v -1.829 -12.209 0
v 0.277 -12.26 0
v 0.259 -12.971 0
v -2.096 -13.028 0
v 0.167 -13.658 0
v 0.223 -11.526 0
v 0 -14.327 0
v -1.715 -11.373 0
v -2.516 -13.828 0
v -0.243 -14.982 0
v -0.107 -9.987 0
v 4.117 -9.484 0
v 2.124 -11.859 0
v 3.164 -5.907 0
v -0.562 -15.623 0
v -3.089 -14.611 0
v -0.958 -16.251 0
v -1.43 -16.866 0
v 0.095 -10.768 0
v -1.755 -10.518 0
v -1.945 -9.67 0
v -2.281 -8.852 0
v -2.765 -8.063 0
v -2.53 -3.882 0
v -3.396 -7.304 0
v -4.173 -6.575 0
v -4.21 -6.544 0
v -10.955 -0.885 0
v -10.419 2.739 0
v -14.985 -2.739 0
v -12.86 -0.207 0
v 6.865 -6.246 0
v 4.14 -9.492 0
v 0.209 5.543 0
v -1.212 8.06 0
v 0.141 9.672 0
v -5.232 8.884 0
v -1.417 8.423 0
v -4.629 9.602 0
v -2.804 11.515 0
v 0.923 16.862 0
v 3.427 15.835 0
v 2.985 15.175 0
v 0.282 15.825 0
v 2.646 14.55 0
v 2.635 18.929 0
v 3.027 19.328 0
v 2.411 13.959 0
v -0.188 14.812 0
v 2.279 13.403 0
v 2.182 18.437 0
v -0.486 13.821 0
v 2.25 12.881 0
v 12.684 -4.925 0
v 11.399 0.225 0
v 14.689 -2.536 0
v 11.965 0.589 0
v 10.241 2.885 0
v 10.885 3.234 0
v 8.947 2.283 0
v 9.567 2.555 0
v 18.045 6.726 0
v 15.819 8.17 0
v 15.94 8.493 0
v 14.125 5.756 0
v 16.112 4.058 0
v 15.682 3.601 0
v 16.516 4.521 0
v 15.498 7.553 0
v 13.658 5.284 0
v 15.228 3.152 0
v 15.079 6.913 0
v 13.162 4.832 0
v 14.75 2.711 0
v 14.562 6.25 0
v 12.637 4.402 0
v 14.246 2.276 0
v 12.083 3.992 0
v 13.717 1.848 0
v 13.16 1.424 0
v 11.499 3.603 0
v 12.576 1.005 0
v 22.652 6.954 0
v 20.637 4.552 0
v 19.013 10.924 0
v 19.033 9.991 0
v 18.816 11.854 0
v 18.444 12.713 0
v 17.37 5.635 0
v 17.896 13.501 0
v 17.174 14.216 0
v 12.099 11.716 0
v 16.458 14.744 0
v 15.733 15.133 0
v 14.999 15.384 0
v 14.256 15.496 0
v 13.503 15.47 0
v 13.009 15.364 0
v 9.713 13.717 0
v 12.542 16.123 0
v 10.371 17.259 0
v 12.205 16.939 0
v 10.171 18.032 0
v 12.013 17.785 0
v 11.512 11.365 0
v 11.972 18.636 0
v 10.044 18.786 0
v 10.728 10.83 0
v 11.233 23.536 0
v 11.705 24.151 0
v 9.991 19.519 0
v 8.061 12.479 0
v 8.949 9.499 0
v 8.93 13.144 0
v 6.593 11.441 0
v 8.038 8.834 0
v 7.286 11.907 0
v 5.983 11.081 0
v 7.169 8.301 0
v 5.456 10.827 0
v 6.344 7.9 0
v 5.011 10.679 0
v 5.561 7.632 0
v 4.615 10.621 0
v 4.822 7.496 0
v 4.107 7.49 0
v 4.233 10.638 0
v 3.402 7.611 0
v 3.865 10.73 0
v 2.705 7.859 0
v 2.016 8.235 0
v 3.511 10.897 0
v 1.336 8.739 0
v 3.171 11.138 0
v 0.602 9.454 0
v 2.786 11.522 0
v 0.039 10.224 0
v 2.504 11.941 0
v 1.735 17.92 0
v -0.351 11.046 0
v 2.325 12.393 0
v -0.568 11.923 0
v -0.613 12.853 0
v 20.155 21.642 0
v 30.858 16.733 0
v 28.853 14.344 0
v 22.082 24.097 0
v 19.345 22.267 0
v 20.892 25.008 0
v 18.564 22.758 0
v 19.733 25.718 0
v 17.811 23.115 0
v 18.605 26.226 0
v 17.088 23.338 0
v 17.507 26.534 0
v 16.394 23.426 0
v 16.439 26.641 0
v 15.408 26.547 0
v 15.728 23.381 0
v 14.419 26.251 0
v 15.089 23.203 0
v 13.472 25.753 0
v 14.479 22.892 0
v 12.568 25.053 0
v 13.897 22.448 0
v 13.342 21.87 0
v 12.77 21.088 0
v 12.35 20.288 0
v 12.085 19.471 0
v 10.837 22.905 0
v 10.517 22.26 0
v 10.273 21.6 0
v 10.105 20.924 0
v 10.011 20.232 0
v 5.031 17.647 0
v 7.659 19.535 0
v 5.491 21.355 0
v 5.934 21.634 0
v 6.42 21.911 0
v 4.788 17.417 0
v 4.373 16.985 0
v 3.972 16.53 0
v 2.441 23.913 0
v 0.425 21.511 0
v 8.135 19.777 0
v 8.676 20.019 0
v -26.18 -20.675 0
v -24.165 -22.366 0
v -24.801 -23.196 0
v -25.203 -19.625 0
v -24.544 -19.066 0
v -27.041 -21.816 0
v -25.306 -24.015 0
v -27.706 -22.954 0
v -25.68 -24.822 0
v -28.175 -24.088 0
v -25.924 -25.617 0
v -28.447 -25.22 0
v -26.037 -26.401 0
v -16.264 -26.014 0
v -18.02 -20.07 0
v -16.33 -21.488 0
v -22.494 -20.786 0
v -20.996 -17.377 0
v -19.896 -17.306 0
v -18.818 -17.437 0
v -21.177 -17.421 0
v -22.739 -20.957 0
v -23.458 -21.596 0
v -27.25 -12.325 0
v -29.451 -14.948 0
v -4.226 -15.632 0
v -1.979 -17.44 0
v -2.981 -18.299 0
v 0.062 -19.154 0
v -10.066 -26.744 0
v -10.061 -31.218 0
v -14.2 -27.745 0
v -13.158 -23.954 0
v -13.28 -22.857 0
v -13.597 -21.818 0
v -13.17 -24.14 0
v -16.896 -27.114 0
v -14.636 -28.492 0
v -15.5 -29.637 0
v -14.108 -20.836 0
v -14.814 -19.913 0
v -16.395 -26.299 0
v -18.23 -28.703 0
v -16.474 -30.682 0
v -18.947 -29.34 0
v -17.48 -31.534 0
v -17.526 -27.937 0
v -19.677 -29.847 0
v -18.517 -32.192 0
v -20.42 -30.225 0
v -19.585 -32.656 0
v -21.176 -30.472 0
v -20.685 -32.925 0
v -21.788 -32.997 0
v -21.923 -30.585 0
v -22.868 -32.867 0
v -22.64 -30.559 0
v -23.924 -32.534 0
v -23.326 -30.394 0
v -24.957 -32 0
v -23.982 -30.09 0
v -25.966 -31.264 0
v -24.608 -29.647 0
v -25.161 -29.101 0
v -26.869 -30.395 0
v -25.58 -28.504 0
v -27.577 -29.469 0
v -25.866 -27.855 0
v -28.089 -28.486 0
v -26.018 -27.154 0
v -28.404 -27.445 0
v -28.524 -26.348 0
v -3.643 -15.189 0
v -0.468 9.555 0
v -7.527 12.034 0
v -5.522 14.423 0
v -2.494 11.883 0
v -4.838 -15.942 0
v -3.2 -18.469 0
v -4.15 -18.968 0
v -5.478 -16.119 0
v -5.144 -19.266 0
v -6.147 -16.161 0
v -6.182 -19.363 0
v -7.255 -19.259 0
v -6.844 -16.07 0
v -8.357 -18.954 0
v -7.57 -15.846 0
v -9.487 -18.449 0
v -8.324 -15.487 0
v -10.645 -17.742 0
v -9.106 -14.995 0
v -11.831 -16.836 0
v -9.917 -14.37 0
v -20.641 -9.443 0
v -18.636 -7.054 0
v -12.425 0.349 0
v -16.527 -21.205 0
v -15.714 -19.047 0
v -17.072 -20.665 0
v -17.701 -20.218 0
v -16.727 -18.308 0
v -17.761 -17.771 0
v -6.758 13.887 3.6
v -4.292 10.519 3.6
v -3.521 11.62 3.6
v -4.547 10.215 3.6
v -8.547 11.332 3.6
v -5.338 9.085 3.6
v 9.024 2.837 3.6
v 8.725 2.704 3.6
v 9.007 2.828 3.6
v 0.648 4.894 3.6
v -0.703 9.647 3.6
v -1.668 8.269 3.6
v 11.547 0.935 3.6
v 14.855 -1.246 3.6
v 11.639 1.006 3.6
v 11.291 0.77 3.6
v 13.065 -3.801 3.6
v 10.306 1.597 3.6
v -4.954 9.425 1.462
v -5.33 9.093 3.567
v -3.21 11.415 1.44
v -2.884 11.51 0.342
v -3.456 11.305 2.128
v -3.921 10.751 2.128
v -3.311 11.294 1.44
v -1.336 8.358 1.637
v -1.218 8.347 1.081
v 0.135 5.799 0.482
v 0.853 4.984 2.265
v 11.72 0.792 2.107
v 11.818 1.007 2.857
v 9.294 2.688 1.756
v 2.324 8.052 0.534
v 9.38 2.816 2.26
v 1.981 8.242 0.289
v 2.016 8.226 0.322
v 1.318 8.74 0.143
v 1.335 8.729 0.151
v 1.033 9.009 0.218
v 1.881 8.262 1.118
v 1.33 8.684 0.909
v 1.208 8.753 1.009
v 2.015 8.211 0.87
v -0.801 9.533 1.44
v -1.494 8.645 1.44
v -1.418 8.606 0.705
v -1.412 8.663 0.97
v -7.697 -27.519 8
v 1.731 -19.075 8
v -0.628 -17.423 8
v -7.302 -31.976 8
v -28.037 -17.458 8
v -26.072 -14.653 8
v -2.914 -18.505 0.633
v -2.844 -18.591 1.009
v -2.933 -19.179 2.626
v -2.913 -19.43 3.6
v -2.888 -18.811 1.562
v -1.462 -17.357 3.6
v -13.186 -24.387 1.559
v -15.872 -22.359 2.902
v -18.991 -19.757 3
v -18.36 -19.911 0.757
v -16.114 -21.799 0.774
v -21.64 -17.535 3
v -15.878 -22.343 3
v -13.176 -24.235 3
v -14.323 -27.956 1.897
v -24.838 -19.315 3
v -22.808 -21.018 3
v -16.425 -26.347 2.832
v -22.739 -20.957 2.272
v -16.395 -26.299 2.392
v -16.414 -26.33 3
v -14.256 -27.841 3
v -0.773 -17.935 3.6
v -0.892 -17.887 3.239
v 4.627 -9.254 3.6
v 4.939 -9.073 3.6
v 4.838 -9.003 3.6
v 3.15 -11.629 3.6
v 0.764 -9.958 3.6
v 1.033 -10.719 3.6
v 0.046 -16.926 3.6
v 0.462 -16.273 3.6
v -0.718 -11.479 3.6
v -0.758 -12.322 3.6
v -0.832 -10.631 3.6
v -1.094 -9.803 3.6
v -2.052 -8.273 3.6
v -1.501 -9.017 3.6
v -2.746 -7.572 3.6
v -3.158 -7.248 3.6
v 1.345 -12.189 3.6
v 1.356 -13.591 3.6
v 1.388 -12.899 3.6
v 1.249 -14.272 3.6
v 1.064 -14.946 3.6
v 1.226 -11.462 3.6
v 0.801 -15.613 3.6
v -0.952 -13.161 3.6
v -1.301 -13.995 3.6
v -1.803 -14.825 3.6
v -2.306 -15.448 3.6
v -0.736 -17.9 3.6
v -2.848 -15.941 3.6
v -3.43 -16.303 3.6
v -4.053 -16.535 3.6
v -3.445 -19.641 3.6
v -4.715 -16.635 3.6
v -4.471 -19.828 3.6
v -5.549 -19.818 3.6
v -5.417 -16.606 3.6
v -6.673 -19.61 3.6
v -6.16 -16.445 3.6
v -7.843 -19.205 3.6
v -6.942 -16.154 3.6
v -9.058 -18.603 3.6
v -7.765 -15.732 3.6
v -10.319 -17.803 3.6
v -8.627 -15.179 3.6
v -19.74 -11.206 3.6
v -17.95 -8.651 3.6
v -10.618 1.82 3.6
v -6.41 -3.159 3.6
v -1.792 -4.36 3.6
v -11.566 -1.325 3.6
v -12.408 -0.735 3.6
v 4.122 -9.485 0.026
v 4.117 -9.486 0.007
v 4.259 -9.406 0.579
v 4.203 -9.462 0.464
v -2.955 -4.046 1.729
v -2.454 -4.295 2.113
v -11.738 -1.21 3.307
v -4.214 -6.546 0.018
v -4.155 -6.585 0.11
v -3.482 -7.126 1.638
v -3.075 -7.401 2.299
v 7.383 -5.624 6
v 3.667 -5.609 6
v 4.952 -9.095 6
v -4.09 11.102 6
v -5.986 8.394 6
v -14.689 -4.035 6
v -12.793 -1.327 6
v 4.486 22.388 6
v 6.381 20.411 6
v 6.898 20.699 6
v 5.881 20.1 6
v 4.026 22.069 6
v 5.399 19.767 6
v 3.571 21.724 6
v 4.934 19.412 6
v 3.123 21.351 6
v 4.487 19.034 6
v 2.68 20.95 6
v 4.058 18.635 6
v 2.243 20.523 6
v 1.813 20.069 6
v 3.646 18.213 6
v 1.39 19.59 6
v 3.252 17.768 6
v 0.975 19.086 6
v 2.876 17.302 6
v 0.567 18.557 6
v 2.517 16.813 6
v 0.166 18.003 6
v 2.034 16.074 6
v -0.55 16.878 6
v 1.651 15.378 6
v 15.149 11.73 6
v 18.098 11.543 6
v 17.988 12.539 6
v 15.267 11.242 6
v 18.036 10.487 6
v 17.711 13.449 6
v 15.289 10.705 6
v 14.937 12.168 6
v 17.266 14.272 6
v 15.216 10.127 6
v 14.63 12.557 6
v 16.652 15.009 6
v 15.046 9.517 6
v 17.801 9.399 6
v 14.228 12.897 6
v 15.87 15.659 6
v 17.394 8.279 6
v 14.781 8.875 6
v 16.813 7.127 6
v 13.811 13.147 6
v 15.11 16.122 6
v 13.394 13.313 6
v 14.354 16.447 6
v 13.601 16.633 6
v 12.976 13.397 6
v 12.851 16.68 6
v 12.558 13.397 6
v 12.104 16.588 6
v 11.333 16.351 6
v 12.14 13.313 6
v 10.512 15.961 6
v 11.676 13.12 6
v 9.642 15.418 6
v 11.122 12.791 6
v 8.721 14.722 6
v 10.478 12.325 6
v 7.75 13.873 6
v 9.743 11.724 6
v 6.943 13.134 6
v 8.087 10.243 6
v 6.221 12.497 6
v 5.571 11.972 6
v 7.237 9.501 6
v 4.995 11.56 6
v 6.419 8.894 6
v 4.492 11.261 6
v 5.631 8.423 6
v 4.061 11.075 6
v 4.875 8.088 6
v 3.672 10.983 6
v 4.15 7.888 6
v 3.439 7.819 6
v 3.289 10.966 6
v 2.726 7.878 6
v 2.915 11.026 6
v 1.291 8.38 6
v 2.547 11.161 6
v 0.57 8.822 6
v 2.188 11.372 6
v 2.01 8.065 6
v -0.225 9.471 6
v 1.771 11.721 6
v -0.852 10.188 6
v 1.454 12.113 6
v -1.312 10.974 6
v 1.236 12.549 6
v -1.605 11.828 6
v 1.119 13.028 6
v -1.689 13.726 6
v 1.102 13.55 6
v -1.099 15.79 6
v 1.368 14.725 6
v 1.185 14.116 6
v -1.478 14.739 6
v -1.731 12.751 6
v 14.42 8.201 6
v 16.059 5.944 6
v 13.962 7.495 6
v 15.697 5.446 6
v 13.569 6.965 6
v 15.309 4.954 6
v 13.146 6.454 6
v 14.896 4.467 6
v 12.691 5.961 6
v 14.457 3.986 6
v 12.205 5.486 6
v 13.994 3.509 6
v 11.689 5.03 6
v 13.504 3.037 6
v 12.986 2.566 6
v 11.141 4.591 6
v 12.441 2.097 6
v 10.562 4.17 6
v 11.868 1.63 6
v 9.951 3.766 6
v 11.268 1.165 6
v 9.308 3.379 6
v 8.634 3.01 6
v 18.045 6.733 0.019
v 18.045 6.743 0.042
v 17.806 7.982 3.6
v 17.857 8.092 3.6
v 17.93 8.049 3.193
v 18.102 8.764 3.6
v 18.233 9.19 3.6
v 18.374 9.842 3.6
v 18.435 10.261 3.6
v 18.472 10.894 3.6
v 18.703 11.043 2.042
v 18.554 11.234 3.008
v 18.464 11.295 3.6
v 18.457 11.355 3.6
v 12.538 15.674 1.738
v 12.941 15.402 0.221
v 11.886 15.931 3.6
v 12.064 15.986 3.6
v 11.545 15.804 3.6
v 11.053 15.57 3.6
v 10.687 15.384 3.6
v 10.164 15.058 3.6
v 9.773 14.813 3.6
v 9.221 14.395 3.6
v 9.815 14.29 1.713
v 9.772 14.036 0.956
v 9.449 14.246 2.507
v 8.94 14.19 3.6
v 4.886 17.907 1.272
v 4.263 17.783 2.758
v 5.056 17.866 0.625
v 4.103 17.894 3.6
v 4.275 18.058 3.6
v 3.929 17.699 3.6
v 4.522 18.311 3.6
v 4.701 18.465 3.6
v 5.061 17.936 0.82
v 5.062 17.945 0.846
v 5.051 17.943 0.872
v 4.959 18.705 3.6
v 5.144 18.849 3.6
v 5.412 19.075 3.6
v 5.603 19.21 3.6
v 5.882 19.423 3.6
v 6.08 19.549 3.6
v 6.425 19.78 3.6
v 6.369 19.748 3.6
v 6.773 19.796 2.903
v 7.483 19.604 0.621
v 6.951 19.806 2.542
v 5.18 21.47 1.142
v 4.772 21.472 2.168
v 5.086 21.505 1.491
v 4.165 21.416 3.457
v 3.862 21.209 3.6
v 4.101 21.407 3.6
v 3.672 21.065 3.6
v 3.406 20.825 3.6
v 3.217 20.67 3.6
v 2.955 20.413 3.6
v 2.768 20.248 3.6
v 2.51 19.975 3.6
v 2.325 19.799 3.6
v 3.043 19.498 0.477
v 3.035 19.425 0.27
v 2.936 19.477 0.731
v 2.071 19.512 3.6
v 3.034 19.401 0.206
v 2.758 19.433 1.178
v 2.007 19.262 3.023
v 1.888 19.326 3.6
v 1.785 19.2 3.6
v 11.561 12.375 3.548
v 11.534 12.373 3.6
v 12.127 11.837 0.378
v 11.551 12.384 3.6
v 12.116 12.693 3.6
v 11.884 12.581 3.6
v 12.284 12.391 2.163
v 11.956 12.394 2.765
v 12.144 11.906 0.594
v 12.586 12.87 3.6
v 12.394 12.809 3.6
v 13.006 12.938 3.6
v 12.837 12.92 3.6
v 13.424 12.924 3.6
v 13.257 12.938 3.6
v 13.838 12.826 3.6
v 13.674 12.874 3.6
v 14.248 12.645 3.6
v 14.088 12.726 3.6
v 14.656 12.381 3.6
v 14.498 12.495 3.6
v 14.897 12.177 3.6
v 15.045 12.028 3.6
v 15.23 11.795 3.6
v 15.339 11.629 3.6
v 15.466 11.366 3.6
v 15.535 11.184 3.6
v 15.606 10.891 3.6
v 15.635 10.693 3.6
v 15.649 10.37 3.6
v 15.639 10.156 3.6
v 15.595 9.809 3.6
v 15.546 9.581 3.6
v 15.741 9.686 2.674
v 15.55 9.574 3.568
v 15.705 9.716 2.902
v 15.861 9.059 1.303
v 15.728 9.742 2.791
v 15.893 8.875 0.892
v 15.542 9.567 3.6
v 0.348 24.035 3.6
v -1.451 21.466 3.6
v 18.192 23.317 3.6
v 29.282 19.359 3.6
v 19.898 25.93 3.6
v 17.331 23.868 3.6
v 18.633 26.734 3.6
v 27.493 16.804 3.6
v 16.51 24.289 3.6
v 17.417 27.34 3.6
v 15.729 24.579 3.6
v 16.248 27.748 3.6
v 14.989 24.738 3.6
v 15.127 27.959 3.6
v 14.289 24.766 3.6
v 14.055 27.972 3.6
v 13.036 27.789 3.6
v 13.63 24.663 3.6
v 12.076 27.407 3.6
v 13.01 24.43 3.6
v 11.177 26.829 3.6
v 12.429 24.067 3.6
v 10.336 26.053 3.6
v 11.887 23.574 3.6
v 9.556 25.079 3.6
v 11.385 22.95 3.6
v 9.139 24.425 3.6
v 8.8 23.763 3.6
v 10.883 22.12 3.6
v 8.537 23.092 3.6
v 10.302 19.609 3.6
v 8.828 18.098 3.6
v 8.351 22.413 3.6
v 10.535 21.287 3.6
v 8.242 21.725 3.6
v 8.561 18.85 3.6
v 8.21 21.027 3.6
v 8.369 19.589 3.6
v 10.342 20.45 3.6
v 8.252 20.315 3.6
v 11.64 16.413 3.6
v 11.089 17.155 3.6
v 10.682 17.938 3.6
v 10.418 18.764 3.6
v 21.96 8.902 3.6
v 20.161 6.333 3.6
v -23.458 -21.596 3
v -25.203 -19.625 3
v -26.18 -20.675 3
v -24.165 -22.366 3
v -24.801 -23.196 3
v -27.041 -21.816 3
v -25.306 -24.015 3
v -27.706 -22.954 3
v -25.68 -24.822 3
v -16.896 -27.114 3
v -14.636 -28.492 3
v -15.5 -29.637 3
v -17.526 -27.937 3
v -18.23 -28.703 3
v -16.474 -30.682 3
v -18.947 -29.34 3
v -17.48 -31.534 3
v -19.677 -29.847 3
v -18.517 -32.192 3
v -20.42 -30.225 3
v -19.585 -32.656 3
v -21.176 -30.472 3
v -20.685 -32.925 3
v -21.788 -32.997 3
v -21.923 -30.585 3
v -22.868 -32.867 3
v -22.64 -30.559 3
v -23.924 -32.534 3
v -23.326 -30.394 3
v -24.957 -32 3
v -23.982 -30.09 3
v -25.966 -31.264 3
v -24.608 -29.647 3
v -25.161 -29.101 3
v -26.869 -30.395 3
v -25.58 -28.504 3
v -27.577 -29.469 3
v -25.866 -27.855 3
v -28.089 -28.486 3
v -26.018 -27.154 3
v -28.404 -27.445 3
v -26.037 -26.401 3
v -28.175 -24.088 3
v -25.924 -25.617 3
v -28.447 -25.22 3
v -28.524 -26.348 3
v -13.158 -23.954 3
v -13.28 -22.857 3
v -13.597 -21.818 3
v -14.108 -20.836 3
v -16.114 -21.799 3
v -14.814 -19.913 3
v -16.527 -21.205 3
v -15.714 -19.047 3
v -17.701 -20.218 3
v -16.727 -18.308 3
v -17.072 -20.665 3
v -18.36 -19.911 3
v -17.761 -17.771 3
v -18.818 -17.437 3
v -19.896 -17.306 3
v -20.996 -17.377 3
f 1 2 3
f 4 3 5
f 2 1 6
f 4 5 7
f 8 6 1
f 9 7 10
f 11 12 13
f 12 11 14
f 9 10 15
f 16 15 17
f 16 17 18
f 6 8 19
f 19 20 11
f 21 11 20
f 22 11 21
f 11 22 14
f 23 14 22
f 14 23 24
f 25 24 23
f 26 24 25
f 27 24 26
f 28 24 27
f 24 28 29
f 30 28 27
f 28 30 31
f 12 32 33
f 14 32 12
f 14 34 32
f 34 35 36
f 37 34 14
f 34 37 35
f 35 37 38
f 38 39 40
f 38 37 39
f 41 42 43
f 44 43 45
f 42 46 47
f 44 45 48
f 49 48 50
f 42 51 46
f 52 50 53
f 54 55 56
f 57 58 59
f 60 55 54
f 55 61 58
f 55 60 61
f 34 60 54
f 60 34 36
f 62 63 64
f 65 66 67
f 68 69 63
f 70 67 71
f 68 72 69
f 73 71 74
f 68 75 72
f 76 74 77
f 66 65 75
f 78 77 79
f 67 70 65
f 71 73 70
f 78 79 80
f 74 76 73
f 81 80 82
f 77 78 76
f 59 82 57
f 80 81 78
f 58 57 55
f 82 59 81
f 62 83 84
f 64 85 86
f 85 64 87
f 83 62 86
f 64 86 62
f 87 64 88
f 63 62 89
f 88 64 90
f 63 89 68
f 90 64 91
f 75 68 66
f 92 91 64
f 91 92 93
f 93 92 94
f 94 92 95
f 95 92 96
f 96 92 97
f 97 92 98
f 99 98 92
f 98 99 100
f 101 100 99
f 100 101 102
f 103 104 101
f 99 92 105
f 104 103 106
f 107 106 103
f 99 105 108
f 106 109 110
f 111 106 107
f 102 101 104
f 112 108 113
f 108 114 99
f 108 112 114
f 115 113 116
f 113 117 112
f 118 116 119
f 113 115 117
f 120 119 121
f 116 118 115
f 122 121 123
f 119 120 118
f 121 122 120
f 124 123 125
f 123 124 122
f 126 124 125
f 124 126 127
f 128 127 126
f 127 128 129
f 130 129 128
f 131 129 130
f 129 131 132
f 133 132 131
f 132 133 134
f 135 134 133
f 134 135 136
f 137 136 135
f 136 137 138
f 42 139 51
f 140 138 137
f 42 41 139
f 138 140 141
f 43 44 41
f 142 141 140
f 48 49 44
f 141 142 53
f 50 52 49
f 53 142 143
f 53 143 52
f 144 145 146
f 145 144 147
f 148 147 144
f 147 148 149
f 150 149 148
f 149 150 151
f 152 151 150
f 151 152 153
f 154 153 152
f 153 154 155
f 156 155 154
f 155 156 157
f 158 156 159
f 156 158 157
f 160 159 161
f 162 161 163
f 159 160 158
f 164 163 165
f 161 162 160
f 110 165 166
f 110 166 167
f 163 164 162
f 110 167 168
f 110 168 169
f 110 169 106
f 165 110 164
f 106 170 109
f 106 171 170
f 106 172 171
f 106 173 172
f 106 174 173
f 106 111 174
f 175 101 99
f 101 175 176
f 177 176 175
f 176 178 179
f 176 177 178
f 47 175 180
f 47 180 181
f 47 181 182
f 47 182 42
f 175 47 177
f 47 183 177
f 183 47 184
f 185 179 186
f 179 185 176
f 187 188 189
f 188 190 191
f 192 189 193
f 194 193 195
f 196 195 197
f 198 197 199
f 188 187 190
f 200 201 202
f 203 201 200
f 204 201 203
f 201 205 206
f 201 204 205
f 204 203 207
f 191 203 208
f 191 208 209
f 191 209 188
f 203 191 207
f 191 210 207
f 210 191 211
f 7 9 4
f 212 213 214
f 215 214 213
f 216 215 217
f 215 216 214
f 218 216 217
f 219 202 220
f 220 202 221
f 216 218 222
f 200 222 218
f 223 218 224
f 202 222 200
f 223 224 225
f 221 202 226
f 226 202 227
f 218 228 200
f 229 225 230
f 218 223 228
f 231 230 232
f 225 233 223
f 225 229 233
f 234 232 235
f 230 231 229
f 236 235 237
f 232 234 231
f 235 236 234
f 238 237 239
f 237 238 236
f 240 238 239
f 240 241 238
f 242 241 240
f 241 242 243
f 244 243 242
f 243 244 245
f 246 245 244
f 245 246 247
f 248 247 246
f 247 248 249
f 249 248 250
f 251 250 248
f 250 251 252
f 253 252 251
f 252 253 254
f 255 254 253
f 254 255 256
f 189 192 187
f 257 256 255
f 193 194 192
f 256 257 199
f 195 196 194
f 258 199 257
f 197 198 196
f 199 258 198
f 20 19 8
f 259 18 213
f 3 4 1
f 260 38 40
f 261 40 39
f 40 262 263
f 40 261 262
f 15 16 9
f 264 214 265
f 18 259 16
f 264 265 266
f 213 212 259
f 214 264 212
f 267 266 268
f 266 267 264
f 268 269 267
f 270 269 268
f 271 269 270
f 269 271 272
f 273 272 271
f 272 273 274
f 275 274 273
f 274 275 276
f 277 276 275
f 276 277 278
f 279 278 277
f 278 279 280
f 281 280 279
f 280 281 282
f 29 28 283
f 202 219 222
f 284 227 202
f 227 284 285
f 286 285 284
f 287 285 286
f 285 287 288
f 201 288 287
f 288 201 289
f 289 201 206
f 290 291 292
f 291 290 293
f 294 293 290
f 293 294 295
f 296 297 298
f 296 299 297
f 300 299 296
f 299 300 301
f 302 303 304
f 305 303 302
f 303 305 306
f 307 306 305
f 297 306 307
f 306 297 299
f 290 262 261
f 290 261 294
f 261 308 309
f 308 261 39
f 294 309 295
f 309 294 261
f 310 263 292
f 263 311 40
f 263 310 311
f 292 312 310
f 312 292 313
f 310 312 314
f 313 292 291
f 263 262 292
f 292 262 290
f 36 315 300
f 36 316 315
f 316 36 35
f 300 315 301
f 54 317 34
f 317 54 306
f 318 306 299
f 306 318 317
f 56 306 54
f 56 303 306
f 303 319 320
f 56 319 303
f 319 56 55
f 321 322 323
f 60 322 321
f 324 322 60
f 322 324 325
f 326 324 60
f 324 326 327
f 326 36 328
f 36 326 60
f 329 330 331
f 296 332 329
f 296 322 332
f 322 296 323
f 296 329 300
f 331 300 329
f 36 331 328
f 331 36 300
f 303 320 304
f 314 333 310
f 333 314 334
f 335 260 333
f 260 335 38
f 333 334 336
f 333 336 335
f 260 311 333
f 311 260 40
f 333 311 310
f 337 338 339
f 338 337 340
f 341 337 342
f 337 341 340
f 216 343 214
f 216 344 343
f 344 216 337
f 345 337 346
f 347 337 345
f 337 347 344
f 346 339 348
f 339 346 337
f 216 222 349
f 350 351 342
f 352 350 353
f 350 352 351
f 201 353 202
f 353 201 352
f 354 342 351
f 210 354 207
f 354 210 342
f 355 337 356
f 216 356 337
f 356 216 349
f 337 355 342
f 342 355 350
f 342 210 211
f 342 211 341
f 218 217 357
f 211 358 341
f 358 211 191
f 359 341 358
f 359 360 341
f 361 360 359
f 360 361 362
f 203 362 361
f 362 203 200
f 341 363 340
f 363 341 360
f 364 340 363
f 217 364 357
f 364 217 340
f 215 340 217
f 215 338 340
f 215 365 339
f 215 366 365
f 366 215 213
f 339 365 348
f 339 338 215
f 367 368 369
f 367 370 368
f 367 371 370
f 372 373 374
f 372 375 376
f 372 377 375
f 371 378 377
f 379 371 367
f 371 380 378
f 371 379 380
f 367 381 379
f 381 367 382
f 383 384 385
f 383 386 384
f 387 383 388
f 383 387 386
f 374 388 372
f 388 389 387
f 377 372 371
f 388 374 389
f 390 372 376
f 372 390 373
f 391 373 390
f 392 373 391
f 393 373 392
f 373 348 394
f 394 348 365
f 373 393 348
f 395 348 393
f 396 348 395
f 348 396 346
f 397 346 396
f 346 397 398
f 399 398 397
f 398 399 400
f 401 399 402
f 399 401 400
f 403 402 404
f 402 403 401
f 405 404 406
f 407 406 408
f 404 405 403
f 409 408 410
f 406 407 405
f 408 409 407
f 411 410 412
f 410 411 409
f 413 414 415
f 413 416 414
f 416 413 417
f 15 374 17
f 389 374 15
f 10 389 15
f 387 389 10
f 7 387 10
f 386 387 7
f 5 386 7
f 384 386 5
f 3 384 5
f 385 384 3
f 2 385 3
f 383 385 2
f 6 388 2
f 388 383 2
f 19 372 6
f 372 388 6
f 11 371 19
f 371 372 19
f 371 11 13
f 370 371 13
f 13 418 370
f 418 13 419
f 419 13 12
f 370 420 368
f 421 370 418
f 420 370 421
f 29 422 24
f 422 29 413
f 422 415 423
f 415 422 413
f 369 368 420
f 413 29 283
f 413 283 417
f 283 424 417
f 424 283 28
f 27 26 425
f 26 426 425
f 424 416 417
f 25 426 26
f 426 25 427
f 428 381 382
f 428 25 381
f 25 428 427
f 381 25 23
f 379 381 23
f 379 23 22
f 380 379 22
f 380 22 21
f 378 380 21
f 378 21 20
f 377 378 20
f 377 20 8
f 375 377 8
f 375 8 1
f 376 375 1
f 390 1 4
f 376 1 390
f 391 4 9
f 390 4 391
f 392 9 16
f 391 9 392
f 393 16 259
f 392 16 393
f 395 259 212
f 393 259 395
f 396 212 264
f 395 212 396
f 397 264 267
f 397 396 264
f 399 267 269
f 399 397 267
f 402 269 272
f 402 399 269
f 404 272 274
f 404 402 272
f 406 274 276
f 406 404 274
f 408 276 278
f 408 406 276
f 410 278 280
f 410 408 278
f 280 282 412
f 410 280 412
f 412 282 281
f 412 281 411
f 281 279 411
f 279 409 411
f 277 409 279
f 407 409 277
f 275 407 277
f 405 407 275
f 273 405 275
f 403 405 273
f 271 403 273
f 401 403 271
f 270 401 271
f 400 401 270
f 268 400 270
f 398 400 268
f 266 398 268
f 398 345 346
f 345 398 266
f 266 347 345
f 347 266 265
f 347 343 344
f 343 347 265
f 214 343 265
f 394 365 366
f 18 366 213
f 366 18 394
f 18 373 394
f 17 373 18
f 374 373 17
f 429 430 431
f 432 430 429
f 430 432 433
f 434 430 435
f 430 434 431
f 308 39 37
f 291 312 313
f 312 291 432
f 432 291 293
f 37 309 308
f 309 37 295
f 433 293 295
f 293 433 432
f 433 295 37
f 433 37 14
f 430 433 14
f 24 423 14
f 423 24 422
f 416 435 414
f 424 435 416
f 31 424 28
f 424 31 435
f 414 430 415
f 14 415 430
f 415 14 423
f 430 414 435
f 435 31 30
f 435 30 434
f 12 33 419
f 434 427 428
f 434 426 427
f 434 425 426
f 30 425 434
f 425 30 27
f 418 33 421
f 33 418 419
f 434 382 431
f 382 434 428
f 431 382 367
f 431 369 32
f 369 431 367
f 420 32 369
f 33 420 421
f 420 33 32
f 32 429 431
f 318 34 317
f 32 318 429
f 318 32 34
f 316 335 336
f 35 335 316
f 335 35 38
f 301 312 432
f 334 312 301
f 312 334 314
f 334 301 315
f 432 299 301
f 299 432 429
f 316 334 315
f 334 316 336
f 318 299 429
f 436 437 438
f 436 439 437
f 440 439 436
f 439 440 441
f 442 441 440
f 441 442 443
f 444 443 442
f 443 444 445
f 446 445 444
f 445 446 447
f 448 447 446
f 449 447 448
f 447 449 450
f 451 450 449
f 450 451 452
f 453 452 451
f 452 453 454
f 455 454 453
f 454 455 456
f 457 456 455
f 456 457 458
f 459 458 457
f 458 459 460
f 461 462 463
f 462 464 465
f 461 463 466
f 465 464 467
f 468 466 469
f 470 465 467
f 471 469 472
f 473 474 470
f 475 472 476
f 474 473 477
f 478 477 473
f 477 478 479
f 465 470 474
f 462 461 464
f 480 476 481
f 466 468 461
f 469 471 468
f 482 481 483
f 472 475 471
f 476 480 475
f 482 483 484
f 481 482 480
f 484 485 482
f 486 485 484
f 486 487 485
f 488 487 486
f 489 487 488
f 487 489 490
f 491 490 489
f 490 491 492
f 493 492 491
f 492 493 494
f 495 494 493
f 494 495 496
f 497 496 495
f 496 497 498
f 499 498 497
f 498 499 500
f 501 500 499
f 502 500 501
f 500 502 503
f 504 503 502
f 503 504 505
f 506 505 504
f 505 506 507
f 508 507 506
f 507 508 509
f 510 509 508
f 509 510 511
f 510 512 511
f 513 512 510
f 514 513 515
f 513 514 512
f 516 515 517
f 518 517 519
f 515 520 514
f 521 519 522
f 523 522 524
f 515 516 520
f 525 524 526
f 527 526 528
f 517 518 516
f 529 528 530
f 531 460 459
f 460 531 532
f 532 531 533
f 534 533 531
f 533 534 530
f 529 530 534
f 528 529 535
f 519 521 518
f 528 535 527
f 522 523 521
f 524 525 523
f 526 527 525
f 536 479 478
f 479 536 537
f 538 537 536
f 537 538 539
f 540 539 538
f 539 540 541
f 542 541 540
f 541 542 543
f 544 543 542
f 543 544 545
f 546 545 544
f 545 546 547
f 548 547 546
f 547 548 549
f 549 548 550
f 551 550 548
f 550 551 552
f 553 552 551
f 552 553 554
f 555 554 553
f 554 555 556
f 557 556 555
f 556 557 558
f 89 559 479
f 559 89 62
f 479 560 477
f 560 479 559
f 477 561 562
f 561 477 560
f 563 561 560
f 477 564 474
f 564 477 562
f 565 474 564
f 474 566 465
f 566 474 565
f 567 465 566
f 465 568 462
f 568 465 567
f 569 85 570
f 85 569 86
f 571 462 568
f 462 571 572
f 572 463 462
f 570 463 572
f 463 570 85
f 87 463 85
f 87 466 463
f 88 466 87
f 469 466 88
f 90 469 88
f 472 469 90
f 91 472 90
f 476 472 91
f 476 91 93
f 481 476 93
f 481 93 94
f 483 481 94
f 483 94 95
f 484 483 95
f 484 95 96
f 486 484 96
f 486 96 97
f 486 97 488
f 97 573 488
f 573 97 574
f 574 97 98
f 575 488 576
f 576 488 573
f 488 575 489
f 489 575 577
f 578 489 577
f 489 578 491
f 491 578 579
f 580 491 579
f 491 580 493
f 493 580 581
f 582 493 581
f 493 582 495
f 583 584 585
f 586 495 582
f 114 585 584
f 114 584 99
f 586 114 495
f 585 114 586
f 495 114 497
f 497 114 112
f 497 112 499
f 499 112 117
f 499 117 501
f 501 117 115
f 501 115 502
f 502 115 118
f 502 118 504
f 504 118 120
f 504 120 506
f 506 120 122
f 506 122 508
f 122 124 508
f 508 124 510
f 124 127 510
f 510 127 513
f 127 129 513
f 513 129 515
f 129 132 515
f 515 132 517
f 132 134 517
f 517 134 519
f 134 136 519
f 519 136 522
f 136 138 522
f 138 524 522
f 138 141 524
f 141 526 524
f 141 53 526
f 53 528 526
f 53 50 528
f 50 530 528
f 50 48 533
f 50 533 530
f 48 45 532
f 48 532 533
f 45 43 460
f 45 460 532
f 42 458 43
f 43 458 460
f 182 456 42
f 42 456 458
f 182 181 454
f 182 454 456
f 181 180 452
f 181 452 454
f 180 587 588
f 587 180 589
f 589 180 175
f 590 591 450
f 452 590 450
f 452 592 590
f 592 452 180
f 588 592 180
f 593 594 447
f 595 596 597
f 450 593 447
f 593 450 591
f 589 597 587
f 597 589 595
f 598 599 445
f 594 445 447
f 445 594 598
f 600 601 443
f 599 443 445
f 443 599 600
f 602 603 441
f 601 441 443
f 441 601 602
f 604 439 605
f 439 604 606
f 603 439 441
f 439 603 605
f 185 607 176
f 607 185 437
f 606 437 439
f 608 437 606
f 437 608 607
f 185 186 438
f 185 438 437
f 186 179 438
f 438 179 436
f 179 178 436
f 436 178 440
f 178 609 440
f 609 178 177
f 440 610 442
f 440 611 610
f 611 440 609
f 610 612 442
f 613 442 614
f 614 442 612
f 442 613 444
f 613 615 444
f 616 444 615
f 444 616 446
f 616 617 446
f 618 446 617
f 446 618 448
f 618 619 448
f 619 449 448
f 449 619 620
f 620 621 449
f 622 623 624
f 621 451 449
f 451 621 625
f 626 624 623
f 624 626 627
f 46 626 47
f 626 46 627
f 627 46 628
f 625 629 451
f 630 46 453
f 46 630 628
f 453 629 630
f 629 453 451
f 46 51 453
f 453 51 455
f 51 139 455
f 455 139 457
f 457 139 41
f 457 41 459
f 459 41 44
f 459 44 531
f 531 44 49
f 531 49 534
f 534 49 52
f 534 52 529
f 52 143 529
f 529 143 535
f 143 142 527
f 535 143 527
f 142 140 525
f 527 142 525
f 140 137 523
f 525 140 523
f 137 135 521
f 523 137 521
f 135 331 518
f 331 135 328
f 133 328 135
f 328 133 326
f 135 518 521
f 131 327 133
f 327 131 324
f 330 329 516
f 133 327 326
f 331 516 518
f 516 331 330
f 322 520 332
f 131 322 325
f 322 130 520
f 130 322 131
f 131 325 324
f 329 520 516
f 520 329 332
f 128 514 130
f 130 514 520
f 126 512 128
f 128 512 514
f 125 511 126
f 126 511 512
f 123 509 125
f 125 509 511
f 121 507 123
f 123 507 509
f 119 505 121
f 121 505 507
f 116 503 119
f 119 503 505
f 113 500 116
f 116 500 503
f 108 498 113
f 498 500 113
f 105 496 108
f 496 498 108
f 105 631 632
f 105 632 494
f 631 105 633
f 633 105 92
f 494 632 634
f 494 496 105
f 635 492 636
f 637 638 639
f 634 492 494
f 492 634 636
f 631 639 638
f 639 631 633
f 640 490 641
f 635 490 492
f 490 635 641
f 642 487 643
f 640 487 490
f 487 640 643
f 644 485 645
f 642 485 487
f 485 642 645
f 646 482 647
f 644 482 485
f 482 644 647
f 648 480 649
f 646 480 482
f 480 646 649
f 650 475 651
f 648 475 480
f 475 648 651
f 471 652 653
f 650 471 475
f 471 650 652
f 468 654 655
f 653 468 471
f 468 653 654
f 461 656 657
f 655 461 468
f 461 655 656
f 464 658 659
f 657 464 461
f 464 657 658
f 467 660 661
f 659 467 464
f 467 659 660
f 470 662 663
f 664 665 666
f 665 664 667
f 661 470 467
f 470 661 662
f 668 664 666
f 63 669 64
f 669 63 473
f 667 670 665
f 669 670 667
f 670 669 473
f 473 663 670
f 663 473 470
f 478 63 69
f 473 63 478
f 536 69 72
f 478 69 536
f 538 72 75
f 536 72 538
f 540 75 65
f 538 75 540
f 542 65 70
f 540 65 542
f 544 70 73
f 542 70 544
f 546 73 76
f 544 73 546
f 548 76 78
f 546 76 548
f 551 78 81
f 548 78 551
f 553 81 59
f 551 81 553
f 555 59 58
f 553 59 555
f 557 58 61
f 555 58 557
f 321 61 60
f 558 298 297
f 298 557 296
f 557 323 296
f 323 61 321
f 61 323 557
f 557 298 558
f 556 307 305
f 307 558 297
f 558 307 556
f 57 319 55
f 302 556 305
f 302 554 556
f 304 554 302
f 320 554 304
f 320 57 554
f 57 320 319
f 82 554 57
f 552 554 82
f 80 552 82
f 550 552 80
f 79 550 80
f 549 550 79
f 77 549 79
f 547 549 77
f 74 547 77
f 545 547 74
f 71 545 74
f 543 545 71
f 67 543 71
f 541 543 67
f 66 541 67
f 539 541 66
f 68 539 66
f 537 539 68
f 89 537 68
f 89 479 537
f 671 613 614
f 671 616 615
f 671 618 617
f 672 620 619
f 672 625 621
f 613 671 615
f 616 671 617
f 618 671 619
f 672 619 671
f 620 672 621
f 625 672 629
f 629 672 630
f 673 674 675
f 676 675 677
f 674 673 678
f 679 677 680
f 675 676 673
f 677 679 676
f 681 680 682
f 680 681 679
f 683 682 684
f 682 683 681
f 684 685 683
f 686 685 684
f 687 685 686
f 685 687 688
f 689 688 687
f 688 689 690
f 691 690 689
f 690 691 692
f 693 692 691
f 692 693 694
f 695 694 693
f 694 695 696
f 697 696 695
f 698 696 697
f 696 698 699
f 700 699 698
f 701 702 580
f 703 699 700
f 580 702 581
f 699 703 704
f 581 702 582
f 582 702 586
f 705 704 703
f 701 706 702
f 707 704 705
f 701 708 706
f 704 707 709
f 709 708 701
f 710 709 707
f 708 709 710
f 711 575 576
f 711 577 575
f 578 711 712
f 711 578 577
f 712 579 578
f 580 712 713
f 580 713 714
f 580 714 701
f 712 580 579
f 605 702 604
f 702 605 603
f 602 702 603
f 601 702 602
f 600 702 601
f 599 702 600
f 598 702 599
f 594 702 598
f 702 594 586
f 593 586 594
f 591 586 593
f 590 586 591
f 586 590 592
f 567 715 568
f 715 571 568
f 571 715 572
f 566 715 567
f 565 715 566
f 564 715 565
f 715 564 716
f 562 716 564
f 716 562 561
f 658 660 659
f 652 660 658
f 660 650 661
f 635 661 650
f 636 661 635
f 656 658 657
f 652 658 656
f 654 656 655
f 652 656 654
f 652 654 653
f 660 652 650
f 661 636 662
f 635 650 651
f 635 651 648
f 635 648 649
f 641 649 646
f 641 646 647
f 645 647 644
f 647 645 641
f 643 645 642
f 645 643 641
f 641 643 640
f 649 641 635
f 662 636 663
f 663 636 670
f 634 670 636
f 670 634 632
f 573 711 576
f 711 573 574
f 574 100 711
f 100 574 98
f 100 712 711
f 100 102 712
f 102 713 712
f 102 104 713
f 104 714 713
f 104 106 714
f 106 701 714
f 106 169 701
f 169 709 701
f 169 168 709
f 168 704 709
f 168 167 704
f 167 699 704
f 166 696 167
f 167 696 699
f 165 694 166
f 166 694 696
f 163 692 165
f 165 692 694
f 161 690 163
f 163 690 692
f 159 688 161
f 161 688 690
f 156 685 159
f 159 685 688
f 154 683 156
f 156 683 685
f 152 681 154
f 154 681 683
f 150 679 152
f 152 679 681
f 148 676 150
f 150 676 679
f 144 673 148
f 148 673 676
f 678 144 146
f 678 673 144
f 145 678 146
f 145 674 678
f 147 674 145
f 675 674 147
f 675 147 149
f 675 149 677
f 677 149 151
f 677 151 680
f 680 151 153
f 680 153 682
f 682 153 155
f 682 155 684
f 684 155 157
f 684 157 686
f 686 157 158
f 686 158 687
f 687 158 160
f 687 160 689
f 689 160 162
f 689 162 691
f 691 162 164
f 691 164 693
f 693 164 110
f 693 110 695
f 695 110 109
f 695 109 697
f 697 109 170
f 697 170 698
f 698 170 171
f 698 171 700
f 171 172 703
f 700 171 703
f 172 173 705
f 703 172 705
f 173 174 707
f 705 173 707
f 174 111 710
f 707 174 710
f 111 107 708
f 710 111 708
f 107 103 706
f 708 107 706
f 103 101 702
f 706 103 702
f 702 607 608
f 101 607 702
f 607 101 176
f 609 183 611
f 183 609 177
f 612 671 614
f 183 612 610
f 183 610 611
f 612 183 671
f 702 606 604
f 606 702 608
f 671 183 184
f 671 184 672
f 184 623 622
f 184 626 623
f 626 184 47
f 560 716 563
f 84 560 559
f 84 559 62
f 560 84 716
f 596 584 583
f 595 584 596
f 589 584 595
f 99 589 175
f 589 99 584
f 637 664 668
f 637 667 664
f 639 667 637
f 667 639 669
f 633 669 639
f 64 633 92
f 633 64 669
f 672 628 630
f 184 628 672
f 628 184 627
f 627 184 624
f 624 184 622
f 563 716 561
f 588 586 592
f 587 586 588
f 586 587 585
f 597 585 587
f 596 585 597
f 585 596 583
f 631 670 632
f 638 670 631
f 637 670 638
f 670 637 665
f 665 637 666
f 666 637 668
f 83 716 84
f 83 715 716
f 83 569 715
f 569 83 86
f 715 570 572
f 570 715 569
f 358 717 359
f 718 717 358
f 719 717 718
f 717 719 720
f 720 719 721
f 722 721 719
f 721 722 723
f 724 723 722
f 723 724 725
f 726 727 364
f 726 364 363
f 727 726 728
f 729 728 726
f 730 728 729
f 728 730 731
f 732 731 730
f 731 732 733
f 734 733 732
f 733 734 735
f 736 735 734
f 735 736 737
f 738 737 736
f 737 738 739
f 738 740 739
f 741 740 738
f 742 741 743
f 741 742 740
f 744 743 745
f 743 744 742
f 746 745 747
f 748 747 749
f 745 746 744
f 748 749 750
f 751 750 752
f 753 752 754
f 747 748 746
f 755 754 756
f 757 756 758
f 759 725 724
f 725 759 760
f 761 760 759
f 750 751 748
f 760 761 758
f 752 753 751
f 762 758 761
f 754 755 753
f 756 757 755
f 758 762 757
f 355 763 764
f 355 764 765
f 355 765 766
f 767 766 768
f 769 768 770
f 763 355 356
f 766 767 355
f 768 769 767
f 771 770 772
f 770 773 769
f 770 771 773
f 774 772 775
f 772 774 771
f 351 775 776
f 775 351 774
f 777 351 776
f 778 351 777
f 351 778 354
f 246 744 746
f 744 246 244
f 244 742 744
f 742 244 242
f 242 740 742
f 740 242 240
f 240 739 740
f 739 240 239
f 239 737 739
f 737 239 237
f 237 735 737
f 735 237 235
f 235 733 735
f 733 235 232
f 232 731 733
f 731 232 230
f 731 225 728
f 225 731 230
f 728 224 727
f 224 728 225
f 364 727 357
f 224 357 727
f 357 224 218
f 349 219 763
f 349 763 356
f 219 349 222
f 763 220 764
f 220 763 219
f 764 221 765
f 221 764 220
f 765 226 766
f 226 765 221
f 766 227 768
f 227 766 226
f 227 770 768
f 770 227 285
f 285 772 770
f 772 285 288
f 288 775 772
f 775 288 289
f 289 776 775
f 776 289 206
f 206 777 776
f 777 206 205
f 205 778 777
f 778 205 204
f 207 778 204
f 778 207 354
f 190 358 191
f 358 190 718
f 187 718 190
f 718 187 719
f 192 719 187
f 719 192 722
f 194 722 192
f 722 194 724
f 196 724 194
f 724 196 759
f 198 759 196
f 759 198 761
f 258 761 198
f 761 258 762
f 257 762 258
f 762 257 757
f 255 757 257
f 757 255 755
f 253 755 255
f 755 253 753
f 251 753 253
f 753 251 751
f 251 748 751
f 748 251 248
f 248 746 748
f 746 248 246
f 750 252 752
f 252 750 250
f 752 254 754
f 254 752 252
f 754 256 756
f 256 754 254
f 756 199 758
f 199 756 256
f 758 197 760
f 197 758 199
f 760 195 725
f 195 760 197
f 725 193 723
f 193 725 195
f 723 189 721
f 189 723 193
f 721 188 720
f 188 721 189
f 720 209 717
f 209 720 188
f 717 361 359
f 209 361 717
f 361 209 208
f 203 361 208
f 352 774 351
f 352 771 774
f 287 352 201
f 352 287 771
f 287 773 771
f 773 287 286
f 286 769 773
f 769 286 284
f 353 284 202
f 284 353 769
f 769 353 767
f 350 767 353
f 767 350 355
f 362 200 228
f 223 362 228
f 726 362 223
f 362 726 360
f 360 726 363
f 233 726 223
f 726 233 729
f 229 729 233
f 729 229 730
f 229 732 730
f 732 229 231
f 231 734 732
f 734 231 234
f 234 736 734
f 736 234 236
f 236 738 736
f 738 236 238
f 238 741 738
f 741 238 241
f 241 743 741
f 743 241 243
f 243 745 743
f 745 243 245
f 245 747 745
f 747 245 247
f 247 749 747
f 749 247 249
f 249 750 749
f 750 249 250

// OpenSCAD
Font_name = "Chewy";
Text = "Luvish";
Rotation = 50;
Connect_dots = true;
Dot_bridge_height_percent = 40;

function char_w(c) = 
    (c == "m" || c == "w") ? 15.0 :
    (c == "i" || c == "l" || c == "j" || c == "t" || c == "f") ? 7.5 :
    (c >= "A" && c <= "Z") ? 14.0 :
    10.5;

function get_step_at(text, i) = 
    (i <= 0) ? 0 :
    ((char_w(text[i-1]) + char_w(text[i])) / 2 * 0.95);

function get_char_x_auto(text, i) = 
    (i <= 0) ? 0 : (get_char_x_auto(text, i - 1) + get_step_at(text, i));

span = get_char_x_auto(Text, len(Text)-1);
cx = span / 2;
loop_x = -cx - 8.5;
loop_y = 0;
twist = -5;
$fn = 32;

rotate([0, 0, Rotation]) {
    union() {
        // Loop
        color("DimGray")
        linear_extrude(height = 3, $fn = $fn)
            translate([loop_x, loop_y, 0]) rotate([0, 0, -90])
                text(size = 20, text = "o", font = Font_name, halign = "center", valign = "center", $fn = $fn);

        // Letters
        for (i = [0 : len(Text) - 1]) {
            h = (i == 0) ? 8.0 : ((i % 2 == 0) ? 6.0 : 3.6);
            char = Text[i];
            char_x = get_char_x_auto(Text, i) - cx;

            color([0.92, 0.72, 0.1]) {
                // Main letter extrusion (full height h)
                linear_extrude(height = h, twist = twist, $fn = $fn)
                    translate([char_x, 0, 0])
                        text(size = 25, text = char, font = Font_name, halign = "center", valign = "center", $fn = $fn);

                // Recessed bridge at 40% height (retains strength, preserves top surface aesthetics)
                if (Connect_dots) {
                    bridge_factor = Dot_bridge_height_percent / 100;
                    bridge_h = h * bridge_factor;
                    bridge_twist = twist * bridge_factor;
                    if (char == "i") {
                        linear_extrude(height = bridge_h, twist = bridge_twist, $fn = $fn)
                            translate([char_x, 0, 0])
                                translate([-1.2, 6.5]) square([2.4, 4.0]);
                    }
                    if (char == "j") {
                        linear_extrude(height = bridge_h, twist = bridge_twist, $fn = $fn)
                            translate([char_x, 0, 0])
                                translate([-1.2, 11.0]) square([2.4, 4.0]);
                    }
                }
            }
        }
    }
}
